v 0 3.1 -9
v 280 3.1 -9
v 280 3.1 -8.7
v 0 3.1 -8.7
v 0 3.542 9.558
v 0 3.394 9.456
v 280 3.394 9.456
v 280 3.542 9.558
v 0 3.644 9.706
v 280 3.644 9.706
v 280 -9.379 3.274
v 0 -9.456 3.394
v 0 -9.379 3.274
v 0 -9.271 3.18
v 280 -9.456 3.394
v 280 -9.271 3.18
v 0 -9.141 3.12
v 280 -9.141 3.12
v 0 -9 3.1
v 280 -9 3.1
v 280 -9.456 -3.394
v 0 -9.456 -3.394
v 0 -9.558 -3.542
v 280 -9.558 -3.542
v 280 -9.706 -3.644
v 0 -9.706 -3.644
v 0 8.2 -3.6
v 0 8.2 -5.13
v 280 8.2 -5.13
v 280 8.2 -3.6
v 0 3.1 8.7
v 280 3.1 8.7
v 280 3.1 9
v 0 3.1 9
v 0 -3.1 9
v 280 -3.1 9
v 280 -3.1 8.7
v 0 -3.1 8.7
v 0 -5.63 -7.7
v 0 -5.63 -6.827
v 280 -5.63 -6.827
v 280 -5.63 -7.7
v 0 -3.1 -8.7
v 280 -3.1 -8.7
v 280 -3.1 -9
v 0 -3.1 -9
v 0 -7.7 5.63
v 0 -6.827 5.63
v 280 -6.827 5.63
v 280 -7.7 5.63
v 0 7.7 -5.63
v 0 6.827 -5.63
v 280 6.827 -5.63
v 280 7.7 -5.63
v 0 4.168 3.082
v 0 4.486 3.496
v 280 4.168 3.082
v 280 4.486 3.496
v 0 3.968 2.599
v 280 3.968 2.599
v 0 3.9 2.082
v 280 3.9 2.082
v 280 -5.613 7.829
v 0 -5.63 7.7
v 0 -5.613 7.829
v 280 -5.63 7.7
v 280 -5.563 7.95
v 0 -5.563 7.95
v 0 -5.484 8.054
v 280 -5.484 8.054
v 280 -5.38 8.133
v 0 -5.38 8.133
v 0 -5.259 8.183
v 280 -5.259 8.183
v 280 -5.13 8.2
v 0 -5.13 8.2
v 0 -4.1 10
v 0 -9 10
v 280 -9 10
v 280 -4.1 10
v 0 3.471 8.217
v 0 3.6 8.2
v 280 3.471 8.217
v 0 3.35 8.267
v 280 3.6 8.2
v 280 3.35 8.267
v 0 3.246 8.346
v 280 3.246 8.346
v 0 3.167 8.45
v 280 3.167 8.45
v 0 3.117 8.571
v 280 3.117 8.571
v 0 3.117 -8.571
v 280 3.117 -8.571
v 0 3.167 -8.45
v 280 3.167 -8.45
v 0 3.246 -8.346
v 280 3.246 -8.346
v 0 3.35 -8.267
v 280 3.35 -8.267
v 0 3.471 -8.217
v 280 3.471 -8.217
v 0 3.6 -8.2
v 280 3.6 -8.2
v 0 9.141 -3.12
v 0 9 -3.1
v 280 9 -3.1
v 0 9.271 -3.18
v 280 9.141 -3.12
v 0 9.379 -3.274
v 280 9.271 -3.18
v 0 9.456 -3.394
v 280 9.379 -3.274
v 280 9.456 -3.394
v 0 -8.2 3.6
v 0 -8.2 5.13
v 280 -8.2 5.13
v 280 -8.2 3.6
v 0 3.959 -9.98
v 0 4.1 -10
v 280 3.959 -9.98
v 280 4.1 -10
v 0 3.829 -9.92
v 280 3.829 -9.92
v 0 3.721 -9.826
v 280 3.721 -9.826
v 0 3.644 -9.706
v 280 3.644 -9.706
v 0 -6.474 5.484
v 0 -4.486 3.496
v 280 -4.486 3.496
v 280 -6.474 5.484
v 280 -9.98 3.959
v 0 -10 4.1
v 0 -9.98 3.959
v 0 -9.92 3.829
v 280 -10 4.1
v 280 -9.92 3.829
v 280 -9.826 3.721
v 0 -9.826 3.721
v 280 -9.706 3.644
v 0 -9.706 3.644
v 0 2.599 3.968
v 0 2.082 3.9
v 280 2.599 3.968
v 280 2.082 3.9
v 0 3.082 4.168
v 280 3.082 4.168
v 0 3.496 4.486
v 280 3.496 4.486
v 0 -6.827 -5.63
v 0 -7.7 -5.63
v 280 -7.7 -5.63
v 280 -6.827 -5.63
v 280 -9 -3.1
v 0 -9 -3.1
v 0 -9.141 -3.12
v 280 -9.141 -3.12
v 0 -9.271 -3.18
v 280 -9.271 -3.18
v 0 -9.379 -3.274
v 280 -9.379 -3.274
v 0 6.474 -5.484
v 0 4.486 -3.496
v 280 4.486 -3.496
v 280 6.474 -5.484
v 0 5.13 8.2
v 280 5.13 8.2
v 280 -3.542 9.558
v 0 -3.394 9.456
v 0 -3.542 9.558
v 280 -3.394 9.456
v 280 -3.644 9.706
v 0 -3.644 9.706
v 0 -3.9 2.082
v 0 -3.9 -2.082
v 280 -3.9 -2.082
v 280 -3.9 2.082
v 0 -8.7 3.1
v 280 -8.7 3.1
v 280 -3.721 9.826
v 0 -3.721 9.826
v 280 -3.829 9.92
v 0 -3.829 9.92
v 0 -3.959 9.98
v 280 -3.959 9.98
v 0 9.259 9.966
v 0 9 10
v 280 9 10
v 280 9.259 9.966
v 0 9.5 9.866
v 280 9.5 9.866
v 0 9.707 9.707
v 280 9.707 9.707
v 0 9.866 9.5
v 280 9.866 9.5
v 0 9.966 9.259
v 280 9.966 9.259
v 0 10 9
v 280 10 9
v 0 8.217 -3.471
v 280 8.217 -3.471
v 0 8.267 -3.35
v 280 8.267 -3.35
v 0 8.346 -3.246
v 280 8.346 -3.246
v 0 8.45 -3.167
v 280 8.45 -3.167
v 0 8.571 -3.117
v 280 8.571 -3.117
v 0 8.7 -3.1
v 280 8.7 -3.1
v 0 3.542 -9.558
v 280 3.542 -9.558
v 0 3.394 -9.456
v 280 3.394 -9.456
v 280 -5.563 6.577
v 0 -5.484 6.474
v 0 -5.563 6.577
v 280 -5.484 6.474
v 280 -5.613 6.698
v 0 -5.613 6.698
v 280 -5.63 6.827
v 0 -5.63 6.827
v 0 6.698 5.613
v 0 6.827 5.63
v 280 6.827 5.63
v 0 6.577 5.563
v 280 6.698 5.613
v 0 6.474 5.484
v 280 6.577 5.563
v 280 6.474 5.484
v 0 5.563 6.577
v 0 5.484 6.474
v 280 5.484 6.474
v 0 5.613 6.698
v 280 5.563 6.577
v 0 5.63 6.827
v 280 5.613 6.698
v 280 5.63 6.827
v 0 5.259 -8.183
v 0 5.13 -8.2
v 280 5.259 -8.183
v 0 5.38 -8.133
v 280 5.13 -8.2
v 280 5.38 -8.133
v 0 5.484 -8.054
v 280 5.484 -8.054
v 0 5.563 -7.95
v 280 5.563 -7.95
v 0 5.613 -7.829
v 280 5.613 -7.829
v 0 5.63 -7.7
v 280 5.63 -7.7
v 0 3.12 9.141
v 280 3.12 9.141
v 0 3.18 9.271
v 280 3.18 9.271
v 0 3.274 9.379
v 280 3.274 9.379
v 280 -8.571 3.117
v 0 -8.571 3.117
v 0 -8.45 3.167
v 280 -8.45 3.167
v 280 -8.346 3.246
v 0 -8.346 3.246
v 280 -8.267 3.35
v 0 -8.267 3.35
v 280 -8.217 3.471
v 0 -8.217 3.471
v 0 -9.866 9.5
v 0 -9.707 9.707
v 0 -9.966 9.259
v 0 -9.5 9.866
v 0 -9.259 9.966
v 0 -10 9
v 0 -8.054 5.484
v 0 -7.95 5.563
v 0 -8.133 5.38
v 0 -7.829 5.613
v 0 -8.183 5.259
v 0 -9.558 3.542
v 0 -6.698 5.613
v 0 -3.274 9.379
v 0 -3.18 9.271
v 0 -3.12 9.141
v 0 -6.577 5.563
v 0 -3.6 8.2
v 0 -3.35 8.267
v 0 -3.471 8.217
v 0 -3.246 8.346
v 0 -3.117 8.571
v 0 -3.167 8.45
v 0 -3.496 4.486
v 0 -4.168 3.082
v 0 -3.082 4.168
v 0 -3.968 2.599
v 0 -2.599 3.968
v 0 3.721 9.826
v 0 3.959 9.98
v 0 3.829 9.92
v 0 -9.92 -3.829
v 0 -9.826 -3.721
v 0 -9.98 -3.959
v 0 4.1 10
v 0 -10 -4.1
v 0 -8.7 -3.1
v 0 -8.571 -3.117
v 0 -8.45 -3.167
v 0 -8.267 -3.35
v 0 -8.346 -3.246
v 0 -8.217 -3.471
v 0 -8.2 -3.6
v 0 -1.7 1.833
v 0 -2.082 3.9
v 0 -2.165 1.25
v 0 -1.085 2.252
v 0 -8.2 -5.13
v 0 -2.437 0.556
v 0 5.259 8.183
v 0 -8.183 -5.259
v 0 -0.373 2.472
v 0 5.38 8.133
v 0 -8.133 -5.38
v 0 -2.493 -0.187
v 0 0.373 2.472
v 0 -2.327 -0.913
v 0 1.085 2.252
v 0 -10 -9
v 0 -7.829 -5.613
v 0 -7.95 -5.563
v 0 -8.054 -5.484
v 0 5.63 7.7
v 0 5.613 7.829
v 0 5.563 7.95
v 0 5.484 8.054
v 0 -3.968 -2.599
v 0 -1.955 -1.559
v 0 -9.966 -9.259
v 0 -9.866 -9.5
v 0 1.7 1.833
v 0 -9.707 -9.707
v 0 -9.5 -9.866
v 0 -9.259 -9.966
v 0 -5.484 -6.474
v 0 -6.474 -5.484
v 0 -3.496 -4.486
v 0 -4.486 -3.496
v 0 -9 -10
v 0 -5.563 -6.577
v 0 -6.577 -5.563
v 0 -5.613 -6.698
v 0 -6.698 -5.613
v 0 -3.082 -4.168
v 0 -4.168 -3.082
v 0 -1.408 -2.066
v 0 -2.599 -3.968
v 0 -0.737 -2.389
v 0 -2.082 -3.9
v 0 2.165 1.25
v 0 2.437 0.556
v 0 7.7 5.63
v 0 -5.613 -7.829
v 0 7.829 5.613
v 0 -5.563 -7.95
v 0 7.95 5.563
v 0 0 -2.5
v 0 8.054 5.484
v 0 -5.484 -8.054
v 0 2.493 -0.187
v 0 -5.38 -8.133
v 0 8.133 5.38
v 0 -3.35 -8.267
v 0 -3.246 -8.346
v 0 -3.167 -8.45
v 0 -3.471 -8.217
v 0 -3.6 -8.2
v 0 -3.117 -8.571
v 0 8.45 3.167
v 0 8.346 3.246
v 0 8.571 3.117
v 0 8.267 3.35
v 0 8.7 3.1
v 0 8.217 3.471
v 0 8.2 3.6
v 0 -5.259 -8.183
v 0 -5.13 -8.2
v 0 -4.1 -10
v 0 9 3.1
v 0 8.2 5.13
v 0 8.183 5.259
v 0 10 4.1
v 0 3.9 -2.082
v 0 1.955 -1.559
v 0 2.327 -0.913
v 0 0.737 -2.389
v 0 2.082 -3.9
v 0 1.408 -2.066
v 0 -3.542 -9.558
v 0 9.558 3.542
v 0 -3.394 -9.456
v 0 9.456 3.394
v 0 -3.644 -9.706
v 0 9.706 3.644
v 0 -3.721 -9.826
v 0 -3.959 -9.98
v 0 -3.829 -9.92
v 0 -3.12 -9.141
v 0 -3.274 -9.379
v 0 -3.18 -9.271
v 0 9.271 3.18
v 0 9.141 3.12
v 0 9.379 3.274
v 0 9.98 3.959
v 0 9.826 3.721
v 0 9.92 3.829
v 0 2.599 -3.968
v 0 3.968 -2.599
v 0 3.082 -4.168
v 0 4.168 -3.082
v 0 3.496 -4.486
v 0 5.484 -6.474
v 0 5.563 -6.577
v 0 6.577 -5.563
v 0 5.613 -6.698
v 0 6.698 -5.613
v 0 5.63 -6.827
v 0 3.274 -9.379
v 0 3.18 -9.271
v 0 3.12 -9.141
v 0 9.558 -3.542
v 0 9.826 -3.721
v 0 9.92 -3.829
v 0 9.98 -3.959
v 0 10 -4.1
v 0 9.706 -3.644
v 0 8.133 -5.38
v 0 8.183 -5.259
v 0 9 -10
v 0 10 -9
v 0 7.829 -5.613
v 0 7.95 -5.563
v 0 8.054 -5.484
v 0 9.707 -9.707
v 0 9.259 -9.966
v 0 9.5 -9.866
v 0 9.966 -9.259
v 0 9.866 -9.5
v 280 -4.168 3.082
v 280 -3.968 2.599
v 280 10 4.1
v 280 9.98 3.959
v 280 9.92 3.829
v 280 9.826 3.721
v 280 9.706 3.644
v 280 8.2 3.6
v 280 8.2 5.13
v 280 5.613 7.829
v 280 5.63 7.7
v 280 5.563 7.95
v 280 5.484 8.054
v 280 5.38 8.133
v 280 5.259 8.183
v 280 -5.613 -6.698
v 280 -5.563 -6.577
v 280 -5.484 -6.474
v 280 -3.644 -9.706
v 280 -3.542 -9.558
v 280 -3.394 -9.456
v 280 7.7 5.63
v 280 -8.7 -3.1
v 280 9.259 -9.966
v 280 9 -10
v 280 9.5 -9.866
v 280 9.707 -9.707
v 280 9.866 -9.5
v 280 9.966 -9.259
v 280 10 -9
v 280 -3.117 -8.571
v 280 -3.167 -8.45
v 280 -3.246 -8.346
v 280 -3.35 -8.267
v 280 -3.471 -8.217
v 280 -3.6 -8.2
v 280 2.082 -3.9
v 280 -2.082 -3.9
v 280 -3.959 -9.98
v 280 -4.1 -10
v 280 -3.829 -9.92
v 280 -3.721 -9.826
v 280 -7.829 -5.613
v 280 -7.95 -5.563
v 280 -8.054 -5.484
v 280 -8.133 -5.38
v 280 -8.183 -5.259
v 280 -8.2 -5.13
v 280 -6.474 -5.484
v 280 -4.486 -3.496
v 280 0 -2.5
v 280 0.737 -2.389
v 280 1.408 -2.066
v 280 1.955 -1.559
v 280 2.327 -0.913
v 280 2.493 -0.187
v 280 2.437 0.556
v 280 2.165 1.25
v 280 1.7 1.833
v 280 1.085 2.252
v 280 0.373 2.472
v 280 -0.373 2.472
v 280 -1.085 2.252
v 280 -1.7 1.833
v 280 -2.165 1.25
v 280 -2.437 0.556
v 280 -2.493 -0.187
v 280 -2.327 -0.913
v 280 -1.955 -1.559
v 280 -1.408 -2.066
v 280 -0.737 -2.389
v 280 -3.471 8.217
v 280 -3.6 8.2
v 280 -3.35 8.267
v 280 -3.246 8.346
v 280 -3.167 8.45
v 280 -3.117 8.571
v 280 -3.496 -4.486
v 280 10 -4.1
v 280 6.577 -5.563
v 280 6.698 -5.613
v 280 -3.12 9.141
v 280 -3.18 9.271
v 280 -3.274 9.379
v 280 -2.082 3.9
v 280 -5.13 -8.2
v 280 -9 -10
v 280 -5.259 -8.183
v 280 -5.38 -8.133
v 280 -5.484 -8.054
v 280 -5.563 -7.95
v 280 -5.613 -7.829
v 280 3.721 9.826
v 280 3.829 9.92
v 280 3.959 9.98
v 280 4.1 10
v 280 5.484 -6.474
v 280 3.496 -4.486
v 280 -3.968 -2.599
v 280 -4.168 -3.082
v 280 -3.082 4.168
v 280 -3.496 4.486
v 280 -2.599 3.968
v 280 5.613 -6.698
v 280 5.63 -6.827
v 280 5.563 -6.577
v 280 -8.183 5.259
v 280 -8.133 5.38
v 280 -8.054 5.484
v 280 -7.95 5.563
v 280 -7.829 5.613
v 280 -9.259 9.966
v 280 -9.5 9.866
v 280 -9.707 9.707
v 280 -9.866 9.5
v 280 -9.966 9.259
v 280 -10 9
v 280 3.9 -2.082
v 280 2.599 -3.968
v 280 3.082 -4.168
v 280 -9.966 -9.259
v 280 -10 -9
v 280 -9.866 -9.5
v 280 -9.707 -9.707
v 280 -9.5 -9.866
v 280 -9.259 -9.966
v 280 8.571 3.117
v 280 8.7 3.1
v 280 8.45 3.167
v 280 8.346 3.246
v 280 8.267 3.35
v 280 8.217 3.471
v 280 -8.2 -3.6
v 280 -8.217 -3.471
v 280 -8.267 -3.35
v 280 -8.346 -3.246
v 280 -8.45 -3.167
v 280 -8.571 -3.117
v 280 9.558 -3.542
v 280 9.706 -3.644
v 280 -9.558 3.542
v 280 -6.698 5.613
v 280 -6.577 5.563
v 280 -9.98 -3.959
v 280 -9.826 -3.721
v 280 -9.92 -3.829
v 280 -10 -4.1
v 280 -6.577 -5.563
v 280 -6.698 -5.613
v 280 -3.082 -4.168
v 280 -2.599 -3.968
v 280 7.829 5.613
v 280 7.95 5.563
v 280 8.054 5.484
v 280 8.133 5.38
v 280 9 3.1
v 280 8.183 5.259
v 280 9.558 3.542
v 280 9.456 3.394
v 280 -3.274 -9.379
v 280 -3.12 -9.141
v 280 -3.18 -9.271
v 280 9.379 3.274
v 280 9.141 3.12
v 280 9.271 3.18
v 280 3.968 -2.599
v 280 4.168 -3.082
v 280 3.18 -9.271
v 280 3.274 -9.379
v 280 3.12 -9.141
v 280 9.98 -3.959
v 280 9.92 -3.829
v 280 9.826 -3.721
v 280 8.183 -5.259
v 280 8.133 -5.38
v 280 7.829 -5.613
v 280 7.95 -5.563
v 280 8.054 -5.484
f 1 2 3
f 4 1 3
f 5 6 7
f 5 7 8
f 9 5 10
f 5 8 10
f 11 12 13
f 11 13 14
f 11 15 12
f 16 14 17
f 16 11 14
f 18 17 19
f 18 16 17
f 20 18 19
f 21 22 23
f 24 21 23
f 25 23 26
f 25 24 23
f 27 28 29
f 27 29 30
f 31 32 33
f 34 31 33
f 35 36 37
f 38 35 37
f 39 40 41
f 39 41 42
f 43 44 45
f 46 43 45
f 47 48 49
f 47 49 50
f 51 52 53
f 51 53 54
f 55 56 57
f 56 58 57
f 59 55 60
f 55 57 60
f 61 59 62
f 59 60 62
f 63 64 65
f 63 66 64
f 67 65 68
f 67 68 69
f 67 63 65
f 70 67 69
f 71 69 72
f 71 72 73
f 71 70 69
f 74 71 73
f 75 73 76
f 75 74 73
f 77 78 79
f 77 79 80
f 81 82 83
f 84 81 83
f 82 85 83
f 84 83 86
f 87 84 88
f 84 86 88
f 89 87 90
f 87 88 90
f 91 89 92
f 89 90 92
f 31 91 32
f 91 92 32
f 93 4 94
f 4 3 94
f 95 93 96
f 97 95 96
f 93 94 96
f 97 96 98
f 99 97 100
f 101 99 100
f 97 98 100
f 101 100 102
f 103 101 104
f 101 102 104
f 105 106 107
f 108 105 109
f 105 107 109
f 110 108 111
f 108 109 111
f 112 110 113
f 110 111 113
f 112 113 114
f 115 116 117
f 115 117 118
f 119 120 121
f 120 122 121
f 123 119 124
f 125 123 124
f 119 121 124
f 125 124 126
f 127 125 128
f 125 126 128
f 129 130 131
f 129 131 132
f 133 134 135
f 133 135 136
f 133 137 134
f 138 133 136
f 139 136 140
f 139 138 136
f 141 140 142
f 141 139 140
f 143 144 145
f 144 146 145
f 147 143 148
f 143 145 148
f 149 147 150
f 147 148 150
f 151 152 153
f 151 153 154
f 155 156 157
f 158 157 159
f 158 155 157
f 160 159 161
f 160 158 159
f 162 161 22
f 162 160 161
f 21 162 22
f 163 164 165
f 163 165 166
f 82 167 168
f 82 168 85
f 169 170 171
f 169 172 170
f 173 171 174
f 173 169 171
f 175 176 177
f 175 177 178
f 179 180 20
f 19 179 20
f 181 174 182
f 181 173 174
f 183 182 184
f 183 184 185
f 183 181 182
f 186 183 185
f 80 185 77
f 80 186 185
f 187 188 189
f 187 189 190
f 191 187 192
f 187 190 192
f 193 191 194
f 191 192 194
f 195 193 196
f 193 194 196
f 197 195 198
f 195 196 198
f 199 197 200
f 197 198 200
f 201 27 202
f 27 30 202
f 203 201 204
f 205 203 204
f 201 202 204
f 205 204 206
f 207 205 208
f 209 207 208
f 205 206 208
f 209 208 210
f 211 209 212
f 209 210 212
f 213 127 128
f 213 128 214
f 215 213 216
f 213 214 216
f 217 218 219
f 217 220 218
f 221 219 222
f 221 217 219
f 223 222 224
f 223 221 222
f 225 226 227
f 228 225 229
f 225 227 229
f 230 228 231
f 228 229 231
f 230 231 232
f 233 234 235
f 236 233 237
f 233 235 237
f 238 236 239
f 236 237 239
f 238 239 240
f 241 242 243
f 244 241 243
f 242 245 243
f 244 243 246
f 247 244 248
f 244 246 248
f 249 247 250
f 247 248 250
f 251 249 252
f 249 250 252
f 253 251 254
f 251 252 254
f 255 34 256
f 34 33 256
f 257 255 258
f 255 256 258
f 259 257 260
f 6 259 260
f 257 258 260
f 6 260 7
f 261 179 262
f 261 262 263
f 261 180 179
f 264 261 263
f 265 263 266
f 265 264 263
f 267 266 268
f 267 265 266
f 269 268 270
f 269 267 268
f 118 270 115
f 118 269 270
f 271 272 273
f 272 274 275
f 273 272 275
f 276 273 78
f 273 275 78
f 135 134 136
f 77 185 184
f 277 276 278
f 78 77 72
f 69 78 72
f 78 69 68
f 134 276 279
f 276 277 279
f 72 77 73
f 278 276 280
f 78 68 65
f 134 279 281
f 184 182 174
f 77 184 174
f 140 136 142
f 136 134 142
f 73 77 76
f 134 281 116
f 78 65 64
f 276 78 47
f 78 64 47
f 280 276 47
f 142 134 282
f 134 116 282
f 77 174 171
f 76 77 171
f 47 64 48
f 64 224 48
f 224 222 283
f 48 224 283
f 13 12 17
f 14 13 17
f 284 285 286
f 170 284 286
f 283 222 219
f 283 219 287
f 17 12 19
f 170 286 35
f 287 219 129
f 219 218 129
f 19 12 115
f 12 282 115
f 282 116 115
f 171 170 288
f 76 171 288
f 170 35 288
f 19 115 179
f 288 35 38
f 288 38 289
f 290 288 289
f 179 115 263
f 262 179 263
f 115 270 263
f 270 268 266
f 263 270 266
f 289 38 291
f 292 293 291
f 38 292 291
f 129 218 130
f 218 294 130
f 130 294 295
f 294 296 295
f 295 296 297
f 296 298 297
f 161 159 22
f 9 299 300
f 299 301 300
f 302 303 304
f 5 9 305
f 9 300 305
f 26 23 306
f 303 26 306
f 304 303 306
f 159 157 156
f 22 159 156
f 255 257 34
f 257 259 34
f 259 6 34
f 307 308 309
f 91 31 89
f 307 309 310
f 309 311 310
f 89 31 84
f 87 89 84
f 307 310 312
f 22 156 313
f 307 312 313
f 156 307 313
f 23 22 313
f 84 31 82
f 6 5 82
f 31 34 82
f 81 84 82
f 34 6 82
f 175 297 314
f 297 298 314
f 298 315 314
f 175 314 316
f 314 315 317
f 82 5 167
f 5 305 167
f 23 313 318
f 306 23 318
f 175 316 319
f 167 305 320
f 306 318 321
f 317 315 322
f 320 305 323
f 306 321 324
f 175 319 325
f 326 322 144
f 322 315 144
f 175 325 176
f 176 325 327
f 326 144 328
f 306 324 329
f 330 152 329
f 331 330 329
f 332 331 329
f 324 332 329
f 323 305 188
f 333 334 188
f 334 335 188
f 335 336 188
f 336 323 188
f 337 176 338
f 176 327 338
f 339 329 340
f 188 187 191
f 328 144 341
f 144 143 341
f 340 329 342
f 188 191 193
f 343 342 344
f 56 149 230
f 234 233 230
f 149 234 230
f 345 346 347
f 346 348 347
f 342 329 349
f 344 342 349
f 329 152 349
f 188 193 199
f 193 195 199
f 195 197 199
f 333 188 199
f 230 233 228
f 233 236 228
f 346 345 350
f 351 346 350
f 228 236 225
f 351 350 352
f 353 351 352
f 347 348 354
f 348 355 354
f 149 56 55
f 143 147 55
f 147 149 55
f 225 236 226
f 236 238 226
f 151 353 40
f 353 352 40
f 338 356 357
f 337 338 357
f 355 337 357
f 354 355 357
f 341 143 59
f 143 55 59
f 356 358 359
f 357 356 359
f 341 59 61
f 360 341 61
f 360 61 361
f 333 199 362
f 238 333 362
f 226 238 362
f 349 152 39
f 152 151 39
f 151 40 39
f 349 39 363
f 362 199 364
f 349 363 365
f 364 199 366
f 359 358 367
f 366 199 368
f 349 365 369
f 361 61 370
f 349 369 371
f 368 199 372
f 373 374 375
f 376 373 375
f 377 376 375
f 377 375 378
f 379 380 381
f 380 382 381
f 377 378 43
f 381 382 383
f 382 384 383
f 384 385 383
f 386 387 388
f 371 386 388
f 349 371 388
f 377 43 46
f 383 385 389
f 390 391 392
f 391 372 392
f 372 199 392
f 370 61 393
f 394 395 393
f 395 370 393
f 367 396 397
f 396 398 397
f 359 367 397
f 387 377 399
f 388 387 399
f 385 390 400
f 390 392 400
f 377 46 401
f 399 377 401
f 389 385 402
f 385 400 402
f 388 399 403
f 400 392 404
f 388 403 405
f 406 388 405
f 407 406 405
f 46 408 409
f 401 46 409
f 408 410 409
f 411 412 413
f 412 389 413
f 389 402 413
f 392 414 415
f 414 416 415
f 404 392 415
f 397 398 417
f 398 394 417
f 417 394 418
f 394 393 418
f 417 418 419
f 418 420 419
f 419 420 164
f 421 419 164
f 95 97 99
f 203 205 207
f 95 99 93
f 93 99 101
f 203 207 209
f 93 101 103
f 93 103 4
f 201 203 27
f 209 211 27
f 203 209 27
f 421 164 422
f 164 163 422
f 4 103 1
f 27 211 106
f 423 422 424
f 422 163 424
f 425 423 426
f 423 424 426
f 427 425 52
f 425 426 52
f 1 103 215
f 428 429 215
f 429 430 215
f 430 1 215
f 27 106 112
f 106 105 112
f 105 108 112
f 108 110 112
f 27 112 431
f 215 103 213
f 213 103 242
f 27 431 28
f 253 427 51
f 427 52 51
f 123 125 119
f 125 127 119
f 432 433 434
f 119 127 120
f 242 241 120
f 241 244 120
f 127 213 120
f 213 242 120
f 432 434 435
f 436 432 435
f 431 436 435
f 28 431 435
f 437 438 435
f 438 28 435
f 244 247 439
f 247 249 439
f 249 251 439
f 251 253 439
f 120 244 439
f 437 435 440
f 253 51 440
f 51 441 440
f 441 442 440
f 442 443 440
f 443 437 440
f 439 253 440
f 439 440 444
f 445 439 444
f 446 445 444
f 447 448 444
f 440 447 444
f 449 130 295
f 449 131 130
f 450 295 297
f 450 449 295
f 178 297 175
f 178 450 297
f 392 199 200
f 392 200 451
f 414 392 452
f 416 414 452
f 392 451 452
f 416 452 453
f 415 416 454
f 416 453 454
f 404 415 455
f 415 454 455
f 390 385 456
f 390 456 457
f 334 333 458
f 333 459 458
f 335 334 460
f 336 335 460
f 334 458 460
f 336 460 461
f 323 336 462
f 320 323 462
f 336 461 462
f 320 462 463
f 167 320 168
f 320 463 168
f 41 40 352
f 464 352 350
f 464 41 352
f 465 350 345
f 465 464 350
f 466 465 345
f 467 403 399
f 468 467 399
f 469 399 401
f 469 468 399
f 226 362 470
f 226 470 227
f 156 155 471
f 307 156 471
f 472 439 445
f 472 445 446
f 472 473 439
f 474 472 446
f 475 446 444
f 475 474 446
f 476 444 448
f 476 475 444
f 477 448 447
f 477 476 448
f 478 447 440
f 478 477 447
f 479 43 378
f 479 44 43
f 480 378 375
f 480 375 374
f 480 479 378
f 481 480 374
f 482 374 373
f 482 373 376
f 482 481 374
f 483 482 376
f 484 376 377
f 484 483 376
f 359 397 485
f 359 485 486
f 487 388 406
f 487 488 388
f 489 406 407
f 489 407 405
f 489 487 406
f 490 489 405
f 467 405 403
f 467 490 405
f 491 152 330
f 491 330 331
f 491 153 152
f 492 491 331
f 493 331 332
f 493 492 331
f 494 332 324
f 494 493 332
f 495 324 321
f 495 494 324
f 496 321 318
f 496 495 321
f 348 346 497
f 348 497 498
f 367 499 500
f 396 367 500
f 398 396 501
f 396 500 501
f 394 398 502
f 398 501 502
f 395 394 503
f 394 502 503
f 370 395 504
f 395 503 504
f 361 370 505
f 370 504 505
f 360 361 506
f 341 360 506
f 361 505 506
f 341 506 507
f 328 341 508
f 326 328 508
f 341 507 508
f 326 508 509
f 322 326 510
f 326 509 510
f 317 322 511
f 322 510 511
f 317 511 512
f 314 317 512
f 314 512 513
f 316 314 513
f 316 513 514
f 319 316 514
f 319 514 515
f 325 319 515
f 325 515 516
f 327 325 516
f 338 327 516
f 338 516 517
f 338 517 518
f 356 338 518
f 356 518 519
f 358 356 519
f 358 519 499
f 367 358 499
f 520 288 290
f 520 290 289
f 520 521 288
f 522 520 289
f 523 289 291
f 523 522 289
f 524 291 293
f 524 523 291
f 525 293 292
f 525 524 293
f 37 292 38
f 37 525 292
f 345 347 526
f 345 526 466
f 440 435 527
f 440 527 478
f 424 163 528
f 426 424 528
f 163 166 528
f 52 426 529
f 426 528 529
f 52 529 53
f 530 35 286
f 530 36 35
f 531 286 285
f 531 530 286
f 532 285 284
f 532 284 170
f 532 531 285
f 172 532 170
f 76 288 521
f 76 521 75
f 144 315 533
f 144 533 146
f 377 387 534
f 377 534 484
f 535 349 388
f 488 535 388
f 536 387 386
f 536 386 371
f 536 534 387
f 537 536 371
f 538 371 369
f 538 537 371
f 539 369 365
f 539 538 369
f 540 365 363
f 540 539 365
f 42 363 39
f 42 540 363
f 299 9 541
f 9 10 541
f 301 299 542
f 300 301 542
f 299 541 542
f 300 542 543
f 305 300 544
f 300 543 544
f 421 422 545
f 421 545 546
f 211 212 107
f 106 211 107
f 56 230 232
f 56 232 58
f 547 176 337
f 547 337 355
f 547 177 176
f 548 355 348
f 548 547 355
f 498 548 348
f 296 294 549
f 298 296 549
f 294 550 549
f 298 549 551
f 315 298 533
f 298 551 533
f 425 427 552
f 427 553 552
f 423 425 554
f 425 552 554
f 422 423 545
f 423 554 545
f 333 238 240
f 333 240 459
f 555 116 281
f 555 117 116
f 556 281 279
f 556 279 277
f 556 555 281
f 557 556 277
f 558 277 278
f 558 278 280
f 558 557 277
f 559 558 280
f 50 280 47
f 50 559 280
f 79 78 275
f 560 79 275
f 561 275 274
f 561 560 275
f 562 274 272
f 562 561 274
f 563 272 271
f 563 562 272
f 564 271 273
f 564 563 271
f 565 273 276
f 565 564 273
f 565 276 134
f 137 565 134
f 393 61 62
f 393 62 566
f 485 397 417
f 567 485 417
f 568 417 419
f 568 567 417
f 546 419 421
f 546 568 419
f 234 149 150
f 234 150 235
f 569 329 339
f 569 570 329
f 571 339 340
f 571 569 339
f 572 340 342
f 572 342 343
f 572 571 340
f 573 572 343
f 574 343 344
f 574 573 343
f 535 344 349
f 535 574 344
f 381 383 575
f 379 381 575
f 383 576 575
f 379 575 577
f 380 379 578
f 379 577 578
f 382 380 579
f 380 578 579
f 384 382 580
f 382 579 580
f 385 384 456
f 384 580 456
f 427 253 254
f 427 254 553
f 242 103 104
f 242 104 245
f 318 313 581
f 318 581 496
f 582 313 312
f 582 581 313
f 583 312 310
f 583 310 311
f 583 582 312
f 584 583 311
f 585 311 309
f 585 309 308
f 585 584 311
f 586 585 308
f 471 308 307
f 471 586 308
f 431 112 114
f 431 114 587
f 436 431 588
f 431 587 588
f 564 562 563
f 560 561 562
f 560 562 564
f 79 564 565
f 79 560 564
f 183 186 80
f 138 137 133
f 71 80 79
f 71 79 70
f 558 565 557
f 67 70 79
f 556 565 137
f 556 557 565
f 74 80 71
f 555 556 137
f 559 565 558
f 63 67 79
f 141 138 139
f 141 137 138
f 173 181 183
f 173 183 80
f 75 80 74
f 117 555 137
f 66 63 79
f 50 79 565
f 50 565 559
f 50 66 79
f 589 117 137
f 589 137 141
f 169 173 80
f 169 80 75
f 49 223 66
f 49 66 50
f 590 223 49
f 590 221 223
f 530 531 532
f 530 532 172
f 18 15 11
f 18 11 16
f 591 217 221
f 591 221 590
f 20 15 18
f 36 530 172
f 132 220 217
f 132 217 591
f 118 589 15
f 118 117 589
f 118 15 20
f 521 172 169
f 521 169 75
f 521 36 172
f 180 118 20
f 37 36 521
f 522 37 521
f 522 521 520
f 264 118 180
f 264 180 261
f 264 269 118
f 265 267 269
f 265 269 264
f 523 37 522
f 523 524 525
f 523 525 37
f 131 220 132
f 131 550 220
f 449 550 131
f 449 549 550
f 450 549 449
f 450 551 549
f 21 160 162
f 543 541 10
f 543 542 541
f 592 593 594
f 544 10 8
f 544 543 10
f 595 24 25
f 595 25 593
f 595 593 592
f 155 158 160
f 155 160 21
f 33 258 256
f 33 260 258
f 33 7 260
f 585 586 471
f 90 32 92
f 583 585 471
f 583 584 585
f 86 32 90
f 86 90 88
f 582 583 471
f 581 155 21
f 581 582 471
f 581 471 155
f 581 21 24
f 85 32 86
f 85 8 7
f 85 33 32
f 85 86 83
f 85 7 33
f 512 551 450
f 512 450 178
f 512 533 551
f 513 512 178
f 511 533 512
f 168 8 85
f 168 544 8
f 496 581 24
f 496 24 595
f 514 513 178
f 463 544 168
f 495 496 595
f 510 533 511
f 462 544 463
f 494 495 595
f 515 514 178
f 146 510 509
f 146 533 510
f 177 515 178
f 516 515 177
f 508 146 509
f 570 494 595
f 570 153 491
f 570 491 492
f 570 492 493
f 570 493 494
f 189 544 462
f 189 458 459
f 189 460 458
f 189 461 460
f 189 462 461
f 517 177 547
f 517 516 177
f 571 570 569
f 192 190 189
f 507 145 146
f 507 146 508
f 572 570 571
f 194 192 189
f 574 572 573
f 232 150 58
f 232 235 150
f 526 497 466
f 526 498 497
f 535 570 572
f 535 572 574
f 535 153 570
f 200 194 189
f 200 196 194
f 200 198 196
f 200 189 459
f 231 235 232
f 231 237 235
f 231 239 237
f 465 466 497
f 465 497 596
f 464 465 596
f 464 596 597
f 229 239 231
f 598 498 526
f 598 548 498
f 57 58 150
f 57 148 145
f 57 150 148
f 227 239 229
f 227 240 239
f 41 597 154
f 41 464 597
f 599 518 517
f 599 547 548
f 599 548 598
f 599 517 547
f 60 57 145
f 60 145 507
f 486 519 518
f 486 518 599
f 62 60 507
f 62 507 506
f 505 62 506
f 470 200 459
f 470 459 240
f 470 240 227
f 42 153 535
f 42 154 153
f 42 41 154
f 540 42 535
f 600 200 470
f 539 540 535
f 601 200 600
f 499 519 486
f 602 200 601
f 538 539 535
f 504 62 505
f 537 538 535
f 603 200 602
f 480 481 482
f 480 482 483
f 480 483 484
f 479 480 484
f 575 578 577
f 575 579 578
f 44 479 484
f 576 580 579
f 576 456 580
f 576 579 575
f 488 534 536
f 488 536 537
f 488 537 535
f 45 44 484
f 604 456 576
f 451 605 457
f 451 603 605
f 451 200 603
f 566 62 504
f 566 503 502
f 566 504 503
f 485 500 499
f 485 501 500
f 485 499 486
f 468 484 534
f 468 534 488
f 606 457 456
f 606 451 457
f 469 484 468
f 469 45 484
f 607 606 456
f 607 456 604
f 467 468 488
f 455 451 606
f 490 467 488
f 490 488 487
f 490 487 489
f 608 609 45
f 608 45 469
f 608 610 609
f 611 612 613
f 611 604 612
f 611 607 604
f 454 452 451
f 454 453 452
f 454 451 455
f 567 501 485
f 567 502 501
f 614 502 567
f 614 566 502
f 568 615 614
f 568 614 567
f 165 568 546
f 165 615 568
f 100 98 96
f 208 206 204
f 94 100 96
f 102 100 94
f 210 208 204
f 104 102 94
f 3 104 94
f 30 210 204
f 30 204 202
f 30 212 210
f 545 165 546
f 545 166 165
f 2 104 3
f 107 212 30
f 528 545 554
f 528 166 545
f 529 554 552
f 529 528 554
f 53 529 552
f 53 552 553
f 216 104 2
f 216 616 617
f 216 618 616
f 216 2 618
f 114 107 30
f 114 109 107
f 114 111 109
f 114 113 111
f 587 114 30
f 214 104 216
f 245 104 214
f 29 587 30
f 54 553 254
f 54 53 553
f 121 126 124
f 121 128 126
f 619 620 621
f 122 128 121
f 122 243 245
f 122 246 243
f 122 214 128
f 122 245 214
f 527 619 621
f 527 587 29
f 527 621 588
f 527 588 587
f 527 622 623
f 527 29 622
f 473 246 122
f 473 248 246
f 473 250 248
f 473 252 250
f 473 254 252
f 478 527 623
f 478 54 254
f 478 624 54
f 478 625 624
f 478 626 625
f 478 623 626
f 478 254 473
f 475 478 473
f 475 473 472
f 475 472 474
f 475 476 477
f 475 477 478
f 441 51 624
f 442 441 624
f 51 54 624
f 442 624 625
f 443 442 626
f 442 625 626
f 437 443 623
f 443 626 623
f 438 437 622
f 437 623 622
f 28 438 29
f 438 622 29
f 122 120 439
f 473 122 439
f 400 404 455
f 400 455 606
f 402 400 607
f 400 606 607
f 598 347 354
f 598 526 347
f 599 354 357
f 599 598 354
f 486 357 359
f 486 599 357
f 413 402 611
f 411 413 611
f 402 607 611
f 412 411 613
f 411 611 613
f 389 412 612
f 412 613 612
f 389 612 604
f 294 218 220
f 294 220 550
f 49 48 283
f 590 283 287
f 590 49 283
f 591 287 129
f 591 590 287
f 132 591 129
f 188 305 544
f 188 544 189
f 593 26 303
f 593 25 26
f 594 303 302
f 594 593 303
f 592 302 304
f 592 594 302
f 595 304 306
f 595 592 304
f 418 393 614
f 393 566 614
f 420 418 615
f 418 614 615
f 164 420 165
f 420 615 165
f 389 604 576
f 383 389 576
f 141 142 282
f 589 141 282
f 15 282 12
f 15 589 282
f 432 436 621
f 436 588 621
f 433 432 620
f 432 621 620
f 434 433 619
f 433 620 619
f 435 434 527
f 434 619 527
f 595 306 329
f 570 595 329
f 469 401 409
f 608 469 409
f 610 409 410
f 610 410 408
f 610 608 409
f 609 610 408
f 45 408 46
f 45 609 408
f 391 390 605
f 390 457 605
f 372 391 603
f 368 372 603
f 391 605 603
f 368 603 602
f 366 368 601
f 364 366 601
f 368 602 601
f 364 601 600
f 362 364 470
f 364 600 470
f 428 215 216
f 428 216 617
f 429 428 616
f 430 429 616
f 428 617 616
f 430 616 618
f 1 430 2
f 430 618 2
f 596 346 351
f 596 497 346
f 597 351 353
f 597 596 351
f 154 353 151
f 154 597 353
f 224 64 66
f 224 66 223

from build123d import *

# Parameters (mm, degrees)
SKETCH1_W                = 20
SKETCH1_H                = 20
BOSS_EXTRUDE1_DEPTH      = 280
FILLET1_R                = 1
CUT_EXTRUDE1_DEPTH       = 281.356915378
F_5_0_5_DIAMETER_HOLE1_D = 5
FILLET2_R                = 2
FILLET3_R                = 0.5
FILLET4_R                = 0.5
FILLET5_R                = 0.5


with BuildPart() as part:
    # Sketch1 → Boss-Extrude1 (new body)
    with BuildSketch(Plane(origin=(0, 0, 0), x_dir=(0, 0, -1), z_dir=(1, 0, 0))):
        Rectangle(SKETCH1_W, SKETCH1_H)
    extrude(amount=BOSS_EXTRUDE1_DEPTH)

    # Fillet1
    fillet1_edges = [part.edges().sort_by_distance(p)[0] for p in [
        (140, 10, 10),
        (140, 10, -10),
        (140, -10, -10),
        (140, -10, 10),
    ]]
    fillet(fillet1_edges, radius=FILLET1_R)

    # Sketch3 → Cut-Extrude1 (cut, through all)
    with BuildSketch(Plane.ZY):
        Polygon((-3.6, 10), (3.6, 10), (3.6, 9.5), (3.1, 9.5), (3.1, 8.2), (5.63, 8.2), (5.63, 6.619949494), (2.910050506, 3.9), (-2.910050506, 3.9), (-5.63, 6.619949494), (-5.63, 8.2), (-3.1, 8.2), (-3.1, 9.5), (-3.6, 9.5), align=None)
        Polygon((10, 3.6), (10, -3.6), (9.5, -3.6), (9.5, -3.1), (8.2, -3.1), (8.2, -5.63), (6.619949494, -5.63), (3.9, -2.910050506), (3.9, 2.910050506), (6.619949494, 5.63), (8.2, 5.63), (8.2, 3.1), (9.5, 3.1), (9.5, 3.6), align=None)
        Polygon((3.6, -10), (-3.6, -10), (-3.6, -9.5), (-3.1, -9.5), (-3.1, -8.2), (-5.63, -8.2), (-5.63, -6.619949494), (-2.910050506, -3.9), (2.910050506, -3.9), (5.63, -6.619949494), (5.63, -8.2), (3.1, -8.2), (3.1, -9.5), (3.6, -9.5), align=None)
        Polygon((-10, -3.6), (-10, 3.6), (-9.5, 3.6), (-9.5, 3.1), (-8.2, 3.1), (-8.2, 5.63), (-6.619949494, 5.63), (-3.9, 2.910050506), (-3.9, -2.910050506), (-6.619949494, -5.63), (-8.2, -5.63), (-8.2, -3.1), (-9.5, -3.1), (-9.5, -3.6), align=None)
    extrude(amount=-CUT_EXTRUDE1_DEPTH, mode=Mode.SUBTRACT)

    # Ø5.0 (5) Diameter Hole1 (through all)
    with Locations(Plane.ZY):
        with Locations((0, 0)):
            Hole(F_5_0_5_DIAMETER_HOLE1_D / 2)

    # Fillet2
    fillet2_edges = [part.edges().sort_by_distance(p)[0] for p in [
        (140, -3.9, -2.910050506),
        (140, -3.9, 2.910050506),
        (140, 2.910050506, -3.9),
        (140, -2.910050506, -3.9),
        (140, -2.910050506, 3.9),
        (140, 2.910050506, 3.9),
        (140, 3.9, 2.910050506),
        (140, 3.9, -2.910050506),
    ]]
    fillet(fillet2_edges, radius=FILLET2_R)

    # Fillet3
    fillet3_edges = [part.edges().sort_by_distance(p)[0] for p in [
        (140, 3.6, -10),
        (140, 3.1, -9.5),
        (140, 3.1, -8.2),
        (140, 5.63, -8.2),
        (140, 5.63, -6.619949494),
        (140, 3.6, 10),
        (140, 3.1, 9.5),
        (140, 3.1, 8.2),
        (140, 5.63, 8.2),
        (140, 5.63, 6.619949494),
        (140, 6.619949494, 5.63),
        (140, 8.2, 5.63),
        (140, 8.2, 3.1),
        (140, 9.5, 3.1),
        (140, 10, 3.6),
        (140, 9.5, -3.1),
        (140, 10, -3.6),
        (140, 8.2, -3.1),
        (140, 8.2, -5.63),
        (140, 6.619949494, -5.63),
    ]]
    fillet(fillet3_edges, radius=FILLET3_R - 0.0001)  # a hair under: the kernel refuses the full size

    # Fillet4
    fillet4_edges = [part.edges().sort_by_distance(p)[0] for p in [
        (140, -3.6, 10),
        (140, -3.1, 9.5),
        (140, -3.1, 8.2),
        (140, -5.63, 8.2),
        (140, -5.63, 6.619949494),
        (140, -6.619949494, 5.63),
        (140, -8.2, 5.63),
        (140, -8.2, 3.1),
        (140, -10, 3.6),
        (140, -9.5, 3.1),
        (140, -10, -3.6),
        (140, -9.5, -3.1),
        (140, -8.2, -3.1),
        (140, -8.2, -5.63),
        (140, -6.619949494, -5.63),
        (140, -5.63, -6.619949494),
        (140, -5.63, -8.2),
        (140, -3.1, -8.2),
        (140, -3.1, -9.5),
        (140, -3.6, -10),
    ]]
    fillet(fillet4_edges, radius=FILLET4_R - 0.0001)  # a hair under: the kernel refuses the full size

    # Fillet5
    fillet5_edges = [part.edges().sort_by_distance(p)[0] for p in [
        (140, 3.6, 9.5),
        (140, 9.5, 3.6),
        (140, 9.5, -3.6),
        (140, 3.6, -9.5),
        (140, -3.6, 9.5),
        (140, -9.5, 3.6),
        (140, -9.5, -3.6),
        (140, -3.6, -9.5),
    ]]
    fillet(fillet5_edges, radius=FILLET5_R)


solid = part.part
